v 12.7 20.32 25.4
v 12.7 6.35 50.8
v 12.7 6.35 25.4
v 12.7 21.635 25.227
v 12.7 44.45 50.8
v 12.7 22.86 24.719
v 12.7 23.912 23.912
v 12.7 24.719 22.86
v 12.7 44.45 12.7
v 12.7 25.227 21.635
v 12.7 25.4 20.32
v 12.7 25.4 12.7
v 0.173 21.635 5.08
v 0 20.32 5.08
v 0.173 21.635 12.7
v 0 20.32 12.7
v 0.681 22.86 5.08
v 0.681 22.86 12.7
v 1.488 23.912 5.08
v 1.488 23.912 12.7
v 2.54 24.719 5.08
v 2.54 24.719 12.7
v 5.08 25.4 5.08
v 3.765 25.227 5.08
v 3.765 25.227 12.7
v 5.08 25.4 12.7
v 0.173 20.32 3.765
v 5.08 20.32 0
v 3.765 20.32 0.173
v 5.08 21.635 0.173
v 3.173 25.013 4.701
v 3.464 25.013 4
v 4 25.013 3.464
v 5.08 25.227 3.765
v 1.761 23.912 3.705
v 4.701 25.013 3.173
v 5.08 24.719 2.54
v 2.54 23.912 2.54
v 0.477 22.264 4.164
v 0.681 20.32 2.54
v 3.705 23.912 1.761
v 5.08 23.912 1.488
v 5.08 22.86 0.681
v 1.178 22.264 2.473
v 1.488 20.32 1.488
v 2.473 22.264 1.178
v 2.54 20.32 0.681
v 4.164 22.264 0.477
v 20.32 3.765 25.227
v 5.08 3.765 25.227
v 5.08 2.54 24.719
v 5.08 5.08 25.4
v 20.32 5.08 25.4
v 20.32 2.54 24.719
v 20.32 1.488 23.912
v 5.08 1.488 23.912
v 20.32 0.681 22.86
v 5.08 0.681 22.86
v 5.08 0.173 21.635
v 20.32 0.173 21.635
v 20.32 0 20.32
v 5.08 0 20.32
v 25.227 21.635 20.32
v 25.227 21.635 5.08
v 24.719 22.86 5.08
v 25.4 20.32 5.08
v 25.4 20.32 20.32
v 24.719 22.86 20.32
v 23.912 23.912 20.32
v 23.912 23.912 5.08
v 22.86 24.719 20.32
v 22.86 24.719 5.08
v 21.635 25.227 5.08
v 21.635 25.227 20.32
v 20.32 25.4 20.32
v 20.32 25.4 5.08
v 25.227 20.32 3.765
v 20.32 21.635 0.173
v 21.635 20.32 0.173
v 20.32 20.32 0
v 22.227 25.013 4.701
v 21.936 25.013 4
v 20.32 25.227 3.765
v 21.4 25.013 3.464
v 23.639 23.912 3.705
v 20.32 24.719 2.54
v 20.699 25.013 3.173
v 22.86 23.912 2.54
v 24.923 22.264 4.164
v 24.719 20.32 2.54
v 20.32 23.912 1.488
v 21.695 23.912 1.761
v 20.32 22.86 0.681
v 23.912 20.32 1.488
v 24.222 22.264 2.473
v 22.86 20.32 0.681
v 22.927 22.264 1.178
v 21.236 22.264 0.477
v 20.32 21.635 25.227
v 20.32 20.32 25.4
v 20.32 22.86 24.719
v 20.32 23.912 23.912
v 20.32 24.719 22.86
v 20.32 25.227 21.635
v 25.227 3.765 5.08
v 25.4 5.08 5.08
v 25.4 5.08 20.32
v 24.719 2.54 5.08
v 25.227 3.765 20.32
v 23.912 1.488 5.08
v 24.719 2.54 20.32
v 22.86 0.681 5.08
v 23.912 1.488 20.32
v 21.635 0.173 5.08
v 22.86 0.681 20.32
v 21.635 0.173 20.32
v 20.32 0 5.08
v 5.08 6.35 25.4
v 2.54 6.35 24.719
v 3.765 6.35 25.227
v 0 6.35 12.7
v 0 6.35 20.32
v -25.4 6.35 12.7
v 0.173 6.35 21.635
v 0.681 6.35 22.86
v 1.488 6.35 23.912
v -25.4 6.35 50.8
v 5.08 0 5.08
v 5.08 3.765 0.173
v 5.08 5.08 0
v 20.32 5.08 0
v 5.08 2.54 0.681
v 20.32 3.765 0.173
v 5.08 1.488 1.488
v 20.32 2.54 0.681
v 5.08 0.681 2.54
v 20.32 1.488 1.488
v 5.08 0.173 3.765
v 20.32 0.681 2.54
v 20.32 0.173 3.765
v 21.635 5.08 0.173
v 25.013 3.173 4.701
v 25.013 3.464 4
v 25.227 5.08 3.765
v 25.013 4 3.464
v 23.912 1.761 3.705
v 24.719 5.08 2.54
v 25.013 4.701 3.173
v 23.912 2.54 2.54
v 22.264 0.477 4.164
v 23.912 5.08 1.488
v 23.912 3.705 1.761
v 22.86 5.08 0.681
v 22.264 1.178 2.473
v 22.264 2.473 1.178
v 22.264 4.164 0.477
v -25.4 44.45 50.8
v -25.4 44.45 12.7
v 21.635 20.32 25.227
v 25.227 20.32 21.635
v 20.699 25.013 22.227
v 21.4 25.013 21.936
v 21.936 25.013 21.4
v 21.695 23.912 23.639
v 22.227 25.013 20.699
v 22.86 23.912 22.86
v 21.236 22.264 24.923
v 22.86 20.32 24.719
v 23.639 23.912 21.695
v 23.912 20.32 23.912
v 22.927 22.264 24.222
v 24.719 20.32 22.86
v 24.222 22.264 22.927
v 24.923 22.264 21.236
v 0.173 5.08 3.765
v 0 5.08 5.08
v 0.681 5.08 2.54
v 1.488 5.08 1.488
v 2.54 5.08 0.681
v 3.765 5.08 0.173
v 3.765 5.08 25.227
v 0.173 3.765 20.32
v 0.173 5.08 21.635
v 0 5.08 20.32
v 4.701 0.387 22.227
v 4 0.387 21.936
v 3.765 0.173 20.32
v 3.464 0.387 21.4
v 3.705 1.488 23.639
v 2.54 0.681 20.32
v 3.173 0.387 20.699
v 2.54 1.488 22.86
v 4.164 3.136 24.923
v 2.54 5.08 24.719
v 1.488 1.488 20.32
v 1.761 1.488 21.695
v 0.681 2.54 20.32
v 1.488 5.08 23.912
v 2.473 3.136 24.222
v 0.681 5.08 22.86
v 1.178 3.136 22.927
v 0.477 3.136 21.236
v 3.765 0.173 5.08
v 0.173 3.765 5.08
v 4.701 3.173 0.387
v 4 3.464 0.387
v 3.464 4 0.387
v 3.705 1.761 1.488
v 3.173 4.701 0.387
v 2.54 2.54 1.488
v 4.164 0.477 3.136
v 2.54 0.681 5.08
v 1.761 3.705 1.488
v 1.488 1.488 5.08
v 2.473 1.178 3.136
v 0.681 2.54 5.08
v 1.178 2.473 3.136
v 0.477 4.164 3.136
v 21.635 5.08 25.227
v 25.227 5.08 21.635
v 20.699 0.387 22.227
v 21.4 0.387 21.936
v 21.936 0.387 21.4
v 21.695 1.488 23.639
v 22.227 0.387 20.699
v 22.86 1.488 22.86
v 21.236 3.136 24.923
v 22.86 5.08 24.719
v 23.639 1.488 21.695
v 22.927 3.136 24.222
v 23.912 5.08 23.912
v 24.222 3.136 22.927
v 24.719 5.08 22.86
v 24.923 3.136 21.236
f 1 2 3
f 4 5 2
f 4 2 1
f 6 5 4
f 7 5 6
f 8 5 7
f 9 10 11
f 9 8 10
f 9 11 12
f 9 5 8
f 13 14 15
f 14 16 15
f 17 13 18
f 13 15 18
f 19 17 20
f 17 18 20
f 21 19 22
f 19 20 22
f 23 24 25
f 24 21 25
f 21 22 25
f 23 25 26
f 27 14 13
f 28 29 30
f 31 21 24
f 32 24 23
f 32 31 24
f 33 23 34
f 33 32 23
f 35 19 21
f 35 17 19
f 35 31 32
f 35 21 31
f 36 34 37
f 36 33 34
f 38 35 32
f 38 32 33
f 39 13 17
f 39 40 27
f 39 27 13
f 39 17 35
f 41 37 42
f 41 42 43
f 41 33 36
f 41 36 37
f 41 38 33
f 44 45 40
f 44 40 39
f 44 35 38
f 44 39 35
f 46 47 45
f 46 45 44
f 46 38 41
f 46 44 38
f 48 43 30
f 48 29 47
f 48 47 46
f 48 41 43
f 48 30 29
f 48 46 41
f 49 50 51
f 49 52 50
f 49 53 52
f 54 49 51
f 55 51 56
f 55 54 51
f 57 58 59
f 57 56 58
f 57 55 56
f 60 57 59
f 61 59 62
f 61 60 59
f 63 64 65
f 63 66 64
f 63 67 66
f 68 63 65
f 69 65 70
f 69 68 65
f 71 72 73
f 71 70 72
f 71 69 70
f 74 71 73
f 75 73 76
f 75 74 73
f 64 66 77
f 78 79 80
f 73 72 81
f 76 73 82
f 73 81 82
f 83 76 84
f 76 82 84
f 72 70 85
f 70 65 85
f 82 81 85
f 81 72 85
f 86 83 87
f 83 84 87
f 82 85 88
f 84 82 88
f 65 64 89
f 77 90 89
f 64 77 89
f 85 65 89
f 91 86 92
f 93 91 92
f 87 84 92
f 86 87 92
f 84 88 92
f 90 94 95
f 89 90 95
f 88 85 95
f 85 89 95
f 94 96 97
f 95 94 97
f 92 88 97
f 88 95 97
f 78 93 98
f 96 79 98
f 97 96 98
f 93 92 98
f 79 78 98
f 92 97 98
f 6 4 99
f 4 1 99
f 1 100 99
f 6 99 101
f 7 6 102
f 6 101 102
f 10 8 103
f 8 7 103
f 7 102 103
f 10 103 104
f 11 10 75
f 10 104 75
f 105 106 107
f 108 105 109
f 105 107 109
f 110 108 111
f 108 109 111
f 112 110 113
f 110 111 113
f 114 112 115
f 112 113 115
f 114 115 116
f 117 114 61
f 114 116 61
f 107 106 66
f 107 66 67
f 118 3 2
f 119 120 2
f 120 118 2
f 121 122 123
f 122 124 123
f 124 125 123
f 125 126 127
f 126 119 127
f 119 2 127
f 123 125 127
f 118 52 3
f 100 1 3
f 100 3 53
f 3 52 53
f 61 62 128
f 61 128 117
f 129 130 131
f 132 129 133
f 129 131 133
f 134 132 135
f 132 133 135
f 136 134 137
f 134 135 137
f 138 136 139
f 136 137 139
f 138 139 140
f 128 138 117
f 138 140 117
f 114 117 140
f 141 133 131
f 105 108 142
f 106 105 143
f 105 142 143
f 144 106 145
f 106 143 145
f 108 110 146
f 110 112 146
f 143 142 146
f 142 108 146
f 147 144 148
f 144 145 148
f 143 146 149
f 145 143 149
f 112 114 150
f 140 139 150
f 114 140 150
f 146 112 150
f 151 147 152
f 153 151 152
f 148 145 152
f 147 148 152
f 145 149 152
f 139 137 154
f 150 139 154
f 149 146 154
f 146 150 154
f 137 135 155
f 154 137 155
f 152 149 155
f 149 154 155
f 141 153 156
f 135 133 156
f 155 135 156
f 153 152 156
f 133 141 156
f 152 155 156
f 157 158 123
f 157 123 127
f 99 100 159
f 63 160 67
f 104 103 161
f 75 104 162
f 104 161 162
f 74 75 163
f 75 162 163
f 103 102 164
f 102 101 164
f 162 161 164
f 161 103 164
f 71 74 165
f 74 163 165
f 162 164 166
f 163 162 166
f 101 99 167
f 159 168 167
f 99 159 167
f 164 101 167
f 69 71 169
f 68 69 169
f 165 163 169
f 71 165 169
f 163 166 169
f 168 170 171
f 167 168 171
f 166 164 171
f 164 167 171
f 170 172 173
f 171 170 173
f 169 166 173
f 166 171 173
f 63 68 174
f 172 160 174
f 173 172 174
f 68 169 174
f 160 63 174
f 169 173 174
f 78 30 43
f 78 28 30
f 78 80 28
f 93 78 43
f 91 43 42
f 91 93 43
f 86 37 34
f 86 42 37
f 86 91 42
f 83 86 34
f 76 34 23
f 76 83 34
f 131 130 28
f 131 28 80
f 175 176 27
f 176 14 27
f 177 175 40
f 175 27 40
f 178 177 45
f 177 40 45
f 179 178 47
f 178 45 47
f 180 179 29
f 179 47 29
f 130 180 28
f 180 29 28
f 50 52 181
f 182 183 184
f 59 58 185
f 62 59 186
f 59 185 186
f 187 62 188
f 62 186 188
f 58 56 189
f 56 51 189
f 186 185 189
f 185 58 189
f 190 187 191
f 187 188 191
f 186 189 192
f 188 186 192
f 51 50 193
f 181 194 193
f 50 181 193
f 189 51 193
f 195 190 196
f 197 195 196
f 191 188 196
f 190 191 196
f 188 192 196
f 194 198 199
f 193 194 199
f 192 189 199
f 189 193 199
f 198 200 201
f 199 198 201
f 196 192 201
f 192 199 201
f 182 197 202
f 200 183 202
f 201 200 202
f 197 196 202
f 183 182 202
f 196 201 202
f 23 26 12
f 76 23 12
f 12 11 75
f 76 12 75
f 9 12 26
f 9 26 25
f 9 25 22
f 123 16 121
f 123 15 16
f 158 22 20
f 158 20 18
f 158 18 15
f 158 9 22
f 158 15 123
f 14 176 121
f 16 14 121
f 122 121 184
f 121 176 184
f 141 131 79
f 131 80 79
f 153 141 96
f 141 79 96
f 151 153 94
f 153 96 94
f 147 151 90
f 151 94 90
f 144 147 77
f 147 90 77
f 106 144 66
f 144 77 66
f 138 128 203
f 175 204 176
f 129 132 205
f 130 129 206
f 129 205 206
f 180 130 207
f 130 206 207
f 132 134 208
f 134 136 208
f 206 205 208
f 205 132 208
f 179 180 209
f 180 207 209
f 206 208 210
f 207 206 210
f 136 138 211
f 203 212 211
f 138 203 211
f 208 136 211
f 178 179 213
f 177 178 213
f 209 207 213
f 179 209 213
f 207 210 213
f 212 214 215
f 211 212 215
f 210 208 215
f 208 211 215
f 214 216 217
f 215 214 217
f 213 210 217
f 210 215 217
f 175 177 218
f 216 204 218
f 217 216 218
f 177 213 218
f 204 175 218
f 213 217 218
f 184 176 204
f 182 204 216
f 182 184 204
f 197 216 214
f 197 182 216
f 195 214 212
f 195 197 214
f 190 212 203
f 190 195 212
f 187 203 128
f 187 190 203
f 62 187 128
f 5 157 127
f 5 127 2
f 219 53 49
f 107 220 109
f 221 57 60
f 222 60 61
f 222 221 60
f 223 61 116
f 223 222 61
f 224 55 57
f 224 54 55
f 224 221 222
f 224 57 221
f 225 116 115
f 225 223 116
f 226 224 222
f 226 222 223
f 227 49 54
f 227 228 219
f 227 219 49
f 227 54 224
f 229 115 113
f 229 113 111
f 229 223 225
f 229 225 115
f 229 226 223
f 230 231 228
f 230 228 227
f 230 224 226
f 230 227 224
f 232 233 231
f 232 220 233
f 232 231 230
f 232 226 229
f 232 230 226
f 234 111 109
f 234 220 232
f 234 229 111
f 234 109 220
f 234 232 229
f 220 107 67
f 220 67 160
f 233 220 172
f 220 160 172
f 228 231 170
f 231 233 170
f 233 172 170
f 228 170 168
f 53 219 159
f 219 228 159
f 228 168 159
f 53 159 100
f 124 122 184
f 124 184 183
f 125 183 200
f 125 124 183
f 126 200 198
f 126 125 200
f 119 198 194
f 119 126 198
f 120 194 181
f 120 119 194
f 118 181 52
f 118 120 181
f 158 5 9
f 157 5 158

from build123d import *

# Parameters (mm, degrees)
F0_W     = 25.4
F0_H     = 25.4
F1_DEPTH = 25.4
F2_R     = 5.08
F3_W     = 7.62
F3_H     = 7.62
F4_DEPTH = 19.05


with BuildPart() as f1:
    # F0 (on Front) → F1 (new body)
    with BuildSketch(Plane.XZ):
        with Locations((12.7, 12.7)):
            Rectangle(F0_W, F0_H)
    extrude(amount=-F1_DEPTH)

    # F2
    f2_edges = [f1.edges().sort_by_distance(p)[0] for p in [
        (25.4, 12.7, 25.4),
        (0, 12.7, 25.4),
        (12.7, 0, 25.4),
        (12.7, 25.4, 25.4),
        (0, 0, 12.7),
        (12.7, 0, 0),
        (25.4, 0, 12.7),
        (25.4, 12.7, 0),
        (25.4, 25.4, 12.7),
        (0, 12.7, 0),
        (0, 25.4, 12.7),
        (12.7, 25.4, 0),
    ]]
    fillet(f2_edges, radius=F2_R)

    # F3 (on face) → F4 (join, symmetric)
    with BuildSketch(Plane(origin=(0, 25.4, 0), x_dir=(-1, 0, 0), z_dir=(0, 1, 0))):
        with Locations((-8.89, 16.51)):
            Rectangle(F3_W, F3_H)
        Polygon((-5.08, 20.32), (-5.08, 12.7), (25.4, 12.7), (25.4, 50.8), (-12.7, 50.8), (-12.7, 20.32), align=None)
    extrude(amount=F4_DEPTH, both=True)


solid = f1.part
